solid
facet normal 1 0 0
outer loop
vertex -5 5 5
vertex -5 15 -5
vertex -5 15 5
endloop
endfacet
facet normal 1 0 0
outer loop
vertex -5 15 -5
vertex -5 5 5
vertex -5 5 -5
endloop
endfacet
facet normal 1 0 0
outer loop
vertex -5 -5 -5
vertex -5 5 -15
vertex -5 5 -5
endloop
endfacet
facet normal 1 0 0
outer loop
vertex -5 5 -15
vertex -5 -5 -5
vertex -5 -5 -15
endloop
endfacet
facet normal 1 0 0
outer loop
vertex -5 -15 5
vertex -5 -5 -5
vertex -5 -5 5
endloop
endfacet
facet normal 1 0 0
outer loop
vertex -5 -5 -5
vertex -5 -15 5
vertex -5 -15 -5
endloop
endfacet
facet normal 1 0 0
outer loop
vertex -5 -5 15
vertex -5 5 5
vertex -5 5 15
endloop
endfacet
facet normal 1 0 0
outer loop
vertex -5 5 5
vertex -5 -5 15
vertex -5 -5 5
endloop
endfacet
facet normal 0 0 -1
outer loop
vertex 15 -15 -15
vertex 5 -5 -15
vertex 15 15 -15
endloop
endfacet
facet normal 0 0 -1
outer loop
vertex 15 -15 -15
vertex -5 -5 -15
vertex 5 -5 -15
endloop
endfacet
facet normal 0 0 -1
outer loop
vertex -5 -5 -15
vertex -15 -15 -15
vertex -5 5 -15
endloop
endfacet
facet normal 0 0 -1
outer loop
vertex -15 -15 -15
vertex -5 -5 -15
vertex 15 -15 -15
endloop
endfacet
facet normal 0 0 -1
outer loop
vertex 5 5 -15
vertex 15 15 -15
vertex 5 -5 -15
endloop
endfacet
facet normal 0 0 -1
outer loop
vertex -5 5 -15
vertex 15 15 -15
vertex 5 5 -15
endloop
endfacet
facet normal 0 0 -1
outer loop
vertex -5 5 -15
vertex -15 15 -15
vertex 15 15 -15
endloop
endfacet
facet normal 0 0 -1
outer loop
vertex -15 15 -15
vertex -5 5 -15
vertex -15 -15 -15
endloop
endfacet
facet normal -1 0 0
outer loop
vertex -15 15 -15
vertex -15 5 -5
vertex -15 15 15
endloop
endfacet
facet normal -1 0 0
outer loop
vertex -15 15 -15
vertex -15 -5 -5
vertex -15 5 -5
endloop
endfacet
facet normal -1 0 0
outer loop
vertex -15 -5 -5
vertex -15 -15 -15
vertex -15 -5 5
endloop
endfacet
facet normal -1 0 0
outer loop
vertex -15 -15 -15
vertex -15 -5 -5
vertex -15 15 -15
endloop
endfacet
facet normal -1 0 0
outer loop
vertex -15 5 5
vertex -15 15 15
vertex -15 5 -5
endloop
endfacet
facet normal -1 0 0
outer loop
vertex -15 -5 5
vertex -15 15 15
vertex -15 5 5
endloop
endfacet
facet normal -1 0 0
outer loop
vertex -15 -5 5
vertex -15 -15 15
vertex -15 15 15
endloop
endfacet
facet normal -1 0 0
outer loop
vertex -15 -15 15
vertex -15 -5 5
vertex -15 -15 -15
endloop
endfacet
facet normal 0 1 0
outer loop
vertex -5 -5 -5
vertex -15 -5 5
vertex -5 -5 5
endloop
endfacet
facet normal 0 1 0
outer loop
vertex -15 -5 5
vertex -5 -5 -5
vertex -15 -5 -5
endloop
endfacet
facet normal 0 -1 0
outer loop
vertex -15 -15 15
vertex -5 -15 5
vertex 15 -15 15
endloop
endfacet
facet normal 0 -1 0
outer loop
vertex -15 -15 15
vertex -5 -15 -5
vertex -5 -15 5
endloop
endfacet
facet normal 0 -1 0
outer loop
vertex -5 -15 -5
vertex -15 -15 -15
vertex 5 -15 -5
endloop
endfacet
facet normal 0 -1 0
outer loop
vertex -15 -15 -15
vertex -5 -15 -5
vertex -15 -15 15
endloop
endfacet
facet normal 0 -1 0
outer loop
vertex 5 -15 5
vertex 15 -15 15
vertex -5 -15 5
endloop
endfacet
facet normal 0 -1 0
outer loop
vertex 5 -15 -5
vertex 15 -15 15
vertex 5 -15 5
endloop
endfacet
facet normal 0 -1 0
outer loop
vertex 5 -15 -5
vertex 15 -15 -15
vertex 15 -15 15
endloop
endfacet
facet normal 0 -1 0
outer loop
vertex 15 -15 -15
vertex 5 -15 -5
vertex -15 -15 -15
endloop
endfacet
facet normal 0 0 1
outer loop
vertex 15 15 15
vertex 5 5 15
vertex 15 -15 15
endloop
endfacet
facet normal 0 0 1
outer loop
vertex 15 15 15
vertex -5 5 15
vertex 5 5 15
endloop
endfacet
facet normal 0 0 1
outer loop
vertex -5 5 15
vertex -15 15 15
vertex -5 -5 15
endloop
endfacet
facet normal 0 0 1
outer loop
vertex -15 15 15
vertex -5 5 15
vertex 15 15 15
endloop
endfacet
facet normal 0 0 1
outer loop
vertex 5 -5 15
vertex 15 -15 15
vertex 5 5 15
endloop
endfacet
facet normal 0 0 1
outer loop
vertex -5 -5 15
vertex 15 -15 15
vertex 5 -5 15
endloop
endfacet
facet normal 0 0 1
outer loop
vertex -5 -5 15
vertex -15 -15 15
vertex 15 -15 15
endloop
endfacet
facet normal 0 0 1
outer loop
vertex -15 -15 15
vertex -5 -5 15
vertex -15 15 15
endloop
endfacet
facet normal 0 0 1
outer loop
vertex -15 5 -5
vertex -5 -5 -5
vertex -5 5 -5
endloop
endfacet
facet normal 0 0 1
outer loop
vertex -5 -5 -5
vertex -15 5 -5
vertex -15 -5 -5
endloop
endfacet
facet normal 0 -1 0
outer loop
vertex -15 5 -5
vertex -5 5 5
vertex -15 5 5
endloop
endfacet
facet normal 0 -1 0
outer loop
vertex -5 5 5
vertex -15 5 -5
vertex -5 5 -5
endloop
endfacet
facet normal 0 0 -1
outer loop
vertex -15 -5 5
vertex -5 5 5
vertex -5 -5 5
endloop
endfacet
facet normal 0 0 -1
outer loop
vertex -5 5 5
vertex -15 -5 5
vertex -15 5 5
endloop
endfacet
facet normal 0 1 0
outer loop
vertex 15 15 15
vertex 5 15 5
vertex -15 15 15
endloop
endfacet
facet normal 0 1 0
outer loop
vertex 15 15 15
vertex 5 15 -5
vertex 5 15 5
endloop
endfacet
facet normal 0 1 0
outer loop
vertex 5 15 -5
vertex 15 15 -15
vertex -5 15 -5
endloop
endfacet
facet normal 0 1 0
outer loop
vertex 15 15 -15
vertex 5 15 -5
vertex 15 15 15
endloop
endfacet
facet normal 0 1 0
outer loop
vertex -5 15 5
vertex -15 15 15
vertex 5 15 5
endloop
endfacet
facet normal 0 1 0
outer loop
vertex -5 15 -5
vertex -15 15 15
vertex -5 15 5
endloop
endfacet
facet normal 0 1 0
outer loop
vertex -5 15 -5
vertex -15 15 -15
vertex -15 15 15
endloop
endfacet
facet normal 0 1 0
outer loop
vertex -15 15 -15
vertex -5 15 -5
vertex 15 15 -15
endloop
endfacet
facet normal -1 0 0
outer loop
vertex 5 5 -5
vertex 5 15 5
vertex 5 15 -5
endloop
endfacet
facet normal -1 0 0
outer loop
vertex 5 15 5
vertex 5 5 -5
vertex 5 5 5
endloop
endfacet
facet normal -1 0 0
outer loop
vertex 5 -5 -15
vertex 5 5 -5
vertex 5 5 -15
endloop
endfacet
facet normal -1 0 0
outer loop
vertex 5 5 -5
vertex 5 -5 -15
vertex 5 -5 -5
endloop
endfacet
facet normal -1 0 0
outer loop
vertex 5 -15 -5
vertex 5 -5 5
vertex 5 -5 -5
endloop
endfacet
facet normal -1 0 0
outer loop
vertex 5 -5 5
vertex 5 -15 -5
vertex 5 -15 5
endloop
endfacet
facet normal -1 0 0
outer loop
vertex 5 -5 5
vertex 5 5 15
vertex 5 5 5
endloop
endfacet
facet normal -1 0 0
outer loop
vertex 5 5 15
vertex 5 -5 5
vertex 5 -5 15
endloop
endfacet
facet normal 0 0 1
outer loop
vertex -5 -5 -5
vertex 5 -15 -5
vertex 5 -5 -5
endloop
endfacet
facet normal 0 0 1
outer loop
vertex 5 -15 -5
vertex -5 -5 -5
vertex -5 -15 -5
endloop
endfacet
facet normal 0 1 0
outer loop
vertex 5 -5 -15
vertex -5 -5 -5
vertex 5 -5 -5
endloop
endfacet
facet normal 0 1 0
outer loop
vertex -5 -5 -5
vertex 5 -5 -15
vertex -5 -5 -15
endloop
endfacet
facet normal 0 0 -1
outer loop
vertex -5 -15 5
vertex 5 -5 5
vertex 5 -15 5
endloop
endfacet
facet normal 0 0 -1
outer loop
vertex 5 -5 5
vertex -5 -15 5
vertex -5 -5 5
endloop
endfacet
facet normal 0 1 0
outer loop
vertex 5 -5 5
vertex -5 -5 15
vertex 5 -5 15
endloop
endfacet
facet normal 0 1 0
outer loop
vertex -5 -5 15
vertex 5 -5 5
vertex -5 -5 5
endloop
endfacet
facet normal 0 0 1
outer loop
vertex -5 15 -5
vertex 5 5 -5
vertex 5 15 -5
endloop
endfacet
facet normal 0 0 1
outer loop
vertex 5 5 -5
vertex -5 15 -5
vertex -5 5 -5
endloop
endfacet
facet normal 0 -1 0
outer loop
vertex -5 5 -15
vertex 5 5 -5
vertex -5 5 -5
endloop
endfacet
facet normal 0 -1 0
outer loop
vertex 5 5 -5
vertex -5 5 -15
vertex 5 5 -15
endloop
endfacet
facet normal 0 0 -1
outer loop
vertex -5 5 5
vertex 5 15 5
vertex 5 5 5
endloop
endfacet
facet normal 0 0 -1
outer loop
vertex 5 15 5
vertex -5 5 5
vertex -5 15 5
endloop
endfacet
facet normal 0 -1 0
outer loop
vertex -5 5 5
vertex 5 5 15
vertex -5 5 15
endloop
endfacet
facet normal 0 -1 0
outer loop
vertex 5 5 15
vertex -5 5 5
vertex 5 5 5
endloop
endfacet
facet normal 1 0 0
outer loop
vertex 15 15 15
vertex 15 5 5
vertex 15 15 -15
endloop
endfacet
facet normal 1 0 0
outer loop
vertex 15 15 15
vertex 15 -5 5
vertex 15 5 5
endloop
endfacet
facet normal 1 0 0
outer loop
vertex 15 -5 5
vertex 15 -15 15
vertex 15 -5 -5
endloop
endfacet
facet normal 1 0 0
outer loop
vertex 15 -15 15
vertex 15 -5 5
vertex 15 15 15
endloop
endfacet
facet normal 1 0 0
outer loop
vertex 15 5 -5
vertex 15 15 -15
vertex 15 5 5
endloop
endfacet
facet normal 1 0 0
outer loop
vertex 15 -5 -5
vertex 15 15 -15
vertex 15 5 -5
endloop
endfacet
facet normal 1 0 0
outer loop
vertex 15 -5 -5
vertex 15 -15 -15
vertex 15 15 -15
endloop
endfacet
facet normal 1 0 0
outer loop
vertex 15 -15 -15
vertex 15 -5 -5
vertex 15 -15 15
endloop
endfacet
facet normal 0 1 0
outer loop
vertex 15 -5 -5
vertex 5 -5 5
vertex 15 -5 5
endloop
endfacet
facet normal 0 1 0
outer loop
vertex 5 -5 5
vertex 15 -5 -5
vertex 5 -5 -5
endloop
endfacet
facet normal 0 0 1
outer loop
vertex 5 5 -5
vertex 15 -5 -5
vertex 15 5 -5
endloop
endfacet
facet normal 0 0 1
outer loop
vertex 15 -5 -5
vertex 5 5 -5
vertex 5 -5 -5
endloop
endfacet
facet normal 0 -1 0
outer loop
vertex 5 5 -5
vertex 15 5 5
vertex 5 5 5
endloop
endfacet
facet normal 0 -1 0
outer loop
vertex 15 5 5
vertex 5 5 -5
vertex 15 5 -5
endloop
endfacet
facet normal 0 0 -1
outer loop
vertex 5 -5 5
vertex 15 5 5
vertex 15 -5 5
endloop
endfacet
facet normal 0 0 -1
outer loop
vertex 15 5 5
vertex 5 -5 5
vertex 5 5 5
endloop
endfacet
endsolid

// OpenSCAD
// Menger sponge fractal — additive (union of 20 sub-cubes per level)
// Union-of-cubes is already in sum-of-products form, so F5 preview
// normalizes trivially.

level = 1;

module menger(s, lvl) {
  if (lvl == 0) {
    cube(s, center=true);
  } else {
    t = s / 3;
    for (x = [-1, 0, 1])
      for (y = [-1, 0, 1])
        for (z = [-1, 0, 1])
          if ((x == 0 ? 0 : 1) + (y == 0 ? 0 : 1) + (z == 0 ? 0 : 1) >= 2)
            translate([x*t, y*t, z*t])
              menger(t, lvl - 1);
  }
}

color("goldenrod")
menger(30, level);
